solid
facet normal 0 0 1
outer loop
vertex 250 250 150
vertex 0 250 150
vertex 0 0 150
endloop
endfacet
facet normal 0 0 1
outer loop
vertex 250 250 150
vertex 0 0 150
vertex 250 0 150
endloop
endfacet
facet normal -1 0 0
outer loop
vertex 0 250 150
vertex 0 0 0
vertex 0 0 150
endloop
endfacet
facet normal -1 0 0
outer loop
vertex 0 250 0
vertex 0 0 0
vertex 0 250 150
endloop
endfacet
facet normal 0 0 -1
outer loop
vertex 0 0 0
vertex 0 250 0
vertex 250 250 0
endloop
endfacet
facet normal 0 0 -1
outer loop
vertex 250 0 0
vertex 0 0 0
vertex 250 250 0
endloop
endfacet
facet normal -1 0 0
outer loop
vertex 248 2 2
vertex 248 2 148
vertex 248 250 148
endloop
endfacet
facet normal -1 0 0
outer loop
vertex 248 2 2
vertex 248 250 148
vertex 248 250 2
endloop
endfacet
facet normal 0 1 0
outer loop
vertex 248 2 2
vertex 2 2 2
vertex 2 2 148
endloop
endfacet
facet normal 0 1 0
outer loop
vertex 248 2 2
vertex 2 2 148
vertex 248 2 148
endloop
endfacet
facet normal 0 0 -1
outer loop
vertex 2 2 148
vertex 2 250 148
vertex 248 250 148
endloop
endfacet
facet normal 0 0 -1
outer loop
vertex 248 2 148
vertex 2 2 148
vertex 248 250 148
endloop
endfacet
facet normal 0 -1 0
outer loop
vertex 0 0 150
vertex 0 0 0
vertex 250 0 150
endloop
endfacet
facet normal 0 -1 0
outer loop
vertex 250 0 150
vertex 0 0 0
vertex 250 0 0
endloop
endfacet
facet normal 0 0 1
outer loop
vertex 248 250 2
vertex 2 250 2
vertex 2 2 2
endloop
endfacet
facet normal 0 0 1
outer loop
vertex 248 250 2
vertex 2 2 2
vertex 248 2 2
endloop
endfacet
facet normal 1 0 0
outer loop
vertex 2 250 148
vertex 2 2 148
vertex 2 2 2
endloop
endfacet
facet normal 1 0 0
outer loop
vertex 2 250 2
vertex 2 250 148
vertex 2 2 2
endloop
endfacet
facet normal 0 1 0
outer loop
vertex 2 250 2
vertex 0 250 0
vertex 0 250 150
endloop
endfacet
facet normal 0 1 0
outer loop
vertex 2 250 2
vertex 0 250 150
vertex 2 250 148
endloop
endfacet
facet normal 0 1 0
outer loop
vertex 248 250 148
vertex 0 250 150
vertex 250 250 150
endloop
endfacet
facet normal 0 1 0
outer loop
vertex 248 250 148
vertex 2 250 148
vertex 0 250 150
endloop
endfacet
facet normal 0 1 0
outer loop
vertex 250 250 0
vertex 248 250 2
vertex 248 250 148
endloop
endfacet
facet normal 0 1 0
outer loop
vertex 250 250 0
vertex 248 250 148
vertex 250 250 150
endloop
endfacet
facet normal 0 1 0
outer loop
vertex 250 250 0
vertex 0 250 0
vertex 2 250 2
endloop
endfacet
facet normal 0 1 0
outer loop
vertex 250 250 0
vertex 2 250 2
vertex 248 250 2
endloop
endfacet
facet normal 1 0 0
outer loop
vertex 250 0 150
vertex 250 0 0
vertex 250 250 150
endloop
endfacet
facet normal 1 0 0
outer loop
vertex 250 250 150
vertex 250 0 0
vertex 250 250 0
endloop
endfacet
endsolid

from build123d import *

# Parameters (mm, degrees)
SKETCH_1_W          = 250
SKETCH_1_H          = 250
EXTRUDE_2_DEPTH     = 150
CUT_EXTRUDE_START   = 250
SKETCH_3_W          = 246
SKETCH_3_H          = 146
CUT_EXTRUDE_1_DEPTH = 248


with BuildPart() as part:
    # 草图1 → 凸台-拉伸2 (new body)
    with BuildSketch(Plane.XY):
        with Locations((125, 125)):
            Rectangle(SKETCH_1_W, SKETCH_1_H)
    extrude(amount=EXTRUDE_2_DEPTH)

    # 草图3 → 切除-拉伸1 (cut)
    with BuildSketch(Plane(origin=(0, 0, 0), x_dir=(1, 0, 0), z_dir=(0, 1, 0)).offset(CUT_EXTRUDE_START)):
        with Locations((125, -75)):
            Rectangle(SKETCH_3_W, SKETCH_3_H)
    extrude(amount=-CUT_EXTRUDE_1_DEPTH, mode=Mode.SUBTRACT)


solid = part.part
